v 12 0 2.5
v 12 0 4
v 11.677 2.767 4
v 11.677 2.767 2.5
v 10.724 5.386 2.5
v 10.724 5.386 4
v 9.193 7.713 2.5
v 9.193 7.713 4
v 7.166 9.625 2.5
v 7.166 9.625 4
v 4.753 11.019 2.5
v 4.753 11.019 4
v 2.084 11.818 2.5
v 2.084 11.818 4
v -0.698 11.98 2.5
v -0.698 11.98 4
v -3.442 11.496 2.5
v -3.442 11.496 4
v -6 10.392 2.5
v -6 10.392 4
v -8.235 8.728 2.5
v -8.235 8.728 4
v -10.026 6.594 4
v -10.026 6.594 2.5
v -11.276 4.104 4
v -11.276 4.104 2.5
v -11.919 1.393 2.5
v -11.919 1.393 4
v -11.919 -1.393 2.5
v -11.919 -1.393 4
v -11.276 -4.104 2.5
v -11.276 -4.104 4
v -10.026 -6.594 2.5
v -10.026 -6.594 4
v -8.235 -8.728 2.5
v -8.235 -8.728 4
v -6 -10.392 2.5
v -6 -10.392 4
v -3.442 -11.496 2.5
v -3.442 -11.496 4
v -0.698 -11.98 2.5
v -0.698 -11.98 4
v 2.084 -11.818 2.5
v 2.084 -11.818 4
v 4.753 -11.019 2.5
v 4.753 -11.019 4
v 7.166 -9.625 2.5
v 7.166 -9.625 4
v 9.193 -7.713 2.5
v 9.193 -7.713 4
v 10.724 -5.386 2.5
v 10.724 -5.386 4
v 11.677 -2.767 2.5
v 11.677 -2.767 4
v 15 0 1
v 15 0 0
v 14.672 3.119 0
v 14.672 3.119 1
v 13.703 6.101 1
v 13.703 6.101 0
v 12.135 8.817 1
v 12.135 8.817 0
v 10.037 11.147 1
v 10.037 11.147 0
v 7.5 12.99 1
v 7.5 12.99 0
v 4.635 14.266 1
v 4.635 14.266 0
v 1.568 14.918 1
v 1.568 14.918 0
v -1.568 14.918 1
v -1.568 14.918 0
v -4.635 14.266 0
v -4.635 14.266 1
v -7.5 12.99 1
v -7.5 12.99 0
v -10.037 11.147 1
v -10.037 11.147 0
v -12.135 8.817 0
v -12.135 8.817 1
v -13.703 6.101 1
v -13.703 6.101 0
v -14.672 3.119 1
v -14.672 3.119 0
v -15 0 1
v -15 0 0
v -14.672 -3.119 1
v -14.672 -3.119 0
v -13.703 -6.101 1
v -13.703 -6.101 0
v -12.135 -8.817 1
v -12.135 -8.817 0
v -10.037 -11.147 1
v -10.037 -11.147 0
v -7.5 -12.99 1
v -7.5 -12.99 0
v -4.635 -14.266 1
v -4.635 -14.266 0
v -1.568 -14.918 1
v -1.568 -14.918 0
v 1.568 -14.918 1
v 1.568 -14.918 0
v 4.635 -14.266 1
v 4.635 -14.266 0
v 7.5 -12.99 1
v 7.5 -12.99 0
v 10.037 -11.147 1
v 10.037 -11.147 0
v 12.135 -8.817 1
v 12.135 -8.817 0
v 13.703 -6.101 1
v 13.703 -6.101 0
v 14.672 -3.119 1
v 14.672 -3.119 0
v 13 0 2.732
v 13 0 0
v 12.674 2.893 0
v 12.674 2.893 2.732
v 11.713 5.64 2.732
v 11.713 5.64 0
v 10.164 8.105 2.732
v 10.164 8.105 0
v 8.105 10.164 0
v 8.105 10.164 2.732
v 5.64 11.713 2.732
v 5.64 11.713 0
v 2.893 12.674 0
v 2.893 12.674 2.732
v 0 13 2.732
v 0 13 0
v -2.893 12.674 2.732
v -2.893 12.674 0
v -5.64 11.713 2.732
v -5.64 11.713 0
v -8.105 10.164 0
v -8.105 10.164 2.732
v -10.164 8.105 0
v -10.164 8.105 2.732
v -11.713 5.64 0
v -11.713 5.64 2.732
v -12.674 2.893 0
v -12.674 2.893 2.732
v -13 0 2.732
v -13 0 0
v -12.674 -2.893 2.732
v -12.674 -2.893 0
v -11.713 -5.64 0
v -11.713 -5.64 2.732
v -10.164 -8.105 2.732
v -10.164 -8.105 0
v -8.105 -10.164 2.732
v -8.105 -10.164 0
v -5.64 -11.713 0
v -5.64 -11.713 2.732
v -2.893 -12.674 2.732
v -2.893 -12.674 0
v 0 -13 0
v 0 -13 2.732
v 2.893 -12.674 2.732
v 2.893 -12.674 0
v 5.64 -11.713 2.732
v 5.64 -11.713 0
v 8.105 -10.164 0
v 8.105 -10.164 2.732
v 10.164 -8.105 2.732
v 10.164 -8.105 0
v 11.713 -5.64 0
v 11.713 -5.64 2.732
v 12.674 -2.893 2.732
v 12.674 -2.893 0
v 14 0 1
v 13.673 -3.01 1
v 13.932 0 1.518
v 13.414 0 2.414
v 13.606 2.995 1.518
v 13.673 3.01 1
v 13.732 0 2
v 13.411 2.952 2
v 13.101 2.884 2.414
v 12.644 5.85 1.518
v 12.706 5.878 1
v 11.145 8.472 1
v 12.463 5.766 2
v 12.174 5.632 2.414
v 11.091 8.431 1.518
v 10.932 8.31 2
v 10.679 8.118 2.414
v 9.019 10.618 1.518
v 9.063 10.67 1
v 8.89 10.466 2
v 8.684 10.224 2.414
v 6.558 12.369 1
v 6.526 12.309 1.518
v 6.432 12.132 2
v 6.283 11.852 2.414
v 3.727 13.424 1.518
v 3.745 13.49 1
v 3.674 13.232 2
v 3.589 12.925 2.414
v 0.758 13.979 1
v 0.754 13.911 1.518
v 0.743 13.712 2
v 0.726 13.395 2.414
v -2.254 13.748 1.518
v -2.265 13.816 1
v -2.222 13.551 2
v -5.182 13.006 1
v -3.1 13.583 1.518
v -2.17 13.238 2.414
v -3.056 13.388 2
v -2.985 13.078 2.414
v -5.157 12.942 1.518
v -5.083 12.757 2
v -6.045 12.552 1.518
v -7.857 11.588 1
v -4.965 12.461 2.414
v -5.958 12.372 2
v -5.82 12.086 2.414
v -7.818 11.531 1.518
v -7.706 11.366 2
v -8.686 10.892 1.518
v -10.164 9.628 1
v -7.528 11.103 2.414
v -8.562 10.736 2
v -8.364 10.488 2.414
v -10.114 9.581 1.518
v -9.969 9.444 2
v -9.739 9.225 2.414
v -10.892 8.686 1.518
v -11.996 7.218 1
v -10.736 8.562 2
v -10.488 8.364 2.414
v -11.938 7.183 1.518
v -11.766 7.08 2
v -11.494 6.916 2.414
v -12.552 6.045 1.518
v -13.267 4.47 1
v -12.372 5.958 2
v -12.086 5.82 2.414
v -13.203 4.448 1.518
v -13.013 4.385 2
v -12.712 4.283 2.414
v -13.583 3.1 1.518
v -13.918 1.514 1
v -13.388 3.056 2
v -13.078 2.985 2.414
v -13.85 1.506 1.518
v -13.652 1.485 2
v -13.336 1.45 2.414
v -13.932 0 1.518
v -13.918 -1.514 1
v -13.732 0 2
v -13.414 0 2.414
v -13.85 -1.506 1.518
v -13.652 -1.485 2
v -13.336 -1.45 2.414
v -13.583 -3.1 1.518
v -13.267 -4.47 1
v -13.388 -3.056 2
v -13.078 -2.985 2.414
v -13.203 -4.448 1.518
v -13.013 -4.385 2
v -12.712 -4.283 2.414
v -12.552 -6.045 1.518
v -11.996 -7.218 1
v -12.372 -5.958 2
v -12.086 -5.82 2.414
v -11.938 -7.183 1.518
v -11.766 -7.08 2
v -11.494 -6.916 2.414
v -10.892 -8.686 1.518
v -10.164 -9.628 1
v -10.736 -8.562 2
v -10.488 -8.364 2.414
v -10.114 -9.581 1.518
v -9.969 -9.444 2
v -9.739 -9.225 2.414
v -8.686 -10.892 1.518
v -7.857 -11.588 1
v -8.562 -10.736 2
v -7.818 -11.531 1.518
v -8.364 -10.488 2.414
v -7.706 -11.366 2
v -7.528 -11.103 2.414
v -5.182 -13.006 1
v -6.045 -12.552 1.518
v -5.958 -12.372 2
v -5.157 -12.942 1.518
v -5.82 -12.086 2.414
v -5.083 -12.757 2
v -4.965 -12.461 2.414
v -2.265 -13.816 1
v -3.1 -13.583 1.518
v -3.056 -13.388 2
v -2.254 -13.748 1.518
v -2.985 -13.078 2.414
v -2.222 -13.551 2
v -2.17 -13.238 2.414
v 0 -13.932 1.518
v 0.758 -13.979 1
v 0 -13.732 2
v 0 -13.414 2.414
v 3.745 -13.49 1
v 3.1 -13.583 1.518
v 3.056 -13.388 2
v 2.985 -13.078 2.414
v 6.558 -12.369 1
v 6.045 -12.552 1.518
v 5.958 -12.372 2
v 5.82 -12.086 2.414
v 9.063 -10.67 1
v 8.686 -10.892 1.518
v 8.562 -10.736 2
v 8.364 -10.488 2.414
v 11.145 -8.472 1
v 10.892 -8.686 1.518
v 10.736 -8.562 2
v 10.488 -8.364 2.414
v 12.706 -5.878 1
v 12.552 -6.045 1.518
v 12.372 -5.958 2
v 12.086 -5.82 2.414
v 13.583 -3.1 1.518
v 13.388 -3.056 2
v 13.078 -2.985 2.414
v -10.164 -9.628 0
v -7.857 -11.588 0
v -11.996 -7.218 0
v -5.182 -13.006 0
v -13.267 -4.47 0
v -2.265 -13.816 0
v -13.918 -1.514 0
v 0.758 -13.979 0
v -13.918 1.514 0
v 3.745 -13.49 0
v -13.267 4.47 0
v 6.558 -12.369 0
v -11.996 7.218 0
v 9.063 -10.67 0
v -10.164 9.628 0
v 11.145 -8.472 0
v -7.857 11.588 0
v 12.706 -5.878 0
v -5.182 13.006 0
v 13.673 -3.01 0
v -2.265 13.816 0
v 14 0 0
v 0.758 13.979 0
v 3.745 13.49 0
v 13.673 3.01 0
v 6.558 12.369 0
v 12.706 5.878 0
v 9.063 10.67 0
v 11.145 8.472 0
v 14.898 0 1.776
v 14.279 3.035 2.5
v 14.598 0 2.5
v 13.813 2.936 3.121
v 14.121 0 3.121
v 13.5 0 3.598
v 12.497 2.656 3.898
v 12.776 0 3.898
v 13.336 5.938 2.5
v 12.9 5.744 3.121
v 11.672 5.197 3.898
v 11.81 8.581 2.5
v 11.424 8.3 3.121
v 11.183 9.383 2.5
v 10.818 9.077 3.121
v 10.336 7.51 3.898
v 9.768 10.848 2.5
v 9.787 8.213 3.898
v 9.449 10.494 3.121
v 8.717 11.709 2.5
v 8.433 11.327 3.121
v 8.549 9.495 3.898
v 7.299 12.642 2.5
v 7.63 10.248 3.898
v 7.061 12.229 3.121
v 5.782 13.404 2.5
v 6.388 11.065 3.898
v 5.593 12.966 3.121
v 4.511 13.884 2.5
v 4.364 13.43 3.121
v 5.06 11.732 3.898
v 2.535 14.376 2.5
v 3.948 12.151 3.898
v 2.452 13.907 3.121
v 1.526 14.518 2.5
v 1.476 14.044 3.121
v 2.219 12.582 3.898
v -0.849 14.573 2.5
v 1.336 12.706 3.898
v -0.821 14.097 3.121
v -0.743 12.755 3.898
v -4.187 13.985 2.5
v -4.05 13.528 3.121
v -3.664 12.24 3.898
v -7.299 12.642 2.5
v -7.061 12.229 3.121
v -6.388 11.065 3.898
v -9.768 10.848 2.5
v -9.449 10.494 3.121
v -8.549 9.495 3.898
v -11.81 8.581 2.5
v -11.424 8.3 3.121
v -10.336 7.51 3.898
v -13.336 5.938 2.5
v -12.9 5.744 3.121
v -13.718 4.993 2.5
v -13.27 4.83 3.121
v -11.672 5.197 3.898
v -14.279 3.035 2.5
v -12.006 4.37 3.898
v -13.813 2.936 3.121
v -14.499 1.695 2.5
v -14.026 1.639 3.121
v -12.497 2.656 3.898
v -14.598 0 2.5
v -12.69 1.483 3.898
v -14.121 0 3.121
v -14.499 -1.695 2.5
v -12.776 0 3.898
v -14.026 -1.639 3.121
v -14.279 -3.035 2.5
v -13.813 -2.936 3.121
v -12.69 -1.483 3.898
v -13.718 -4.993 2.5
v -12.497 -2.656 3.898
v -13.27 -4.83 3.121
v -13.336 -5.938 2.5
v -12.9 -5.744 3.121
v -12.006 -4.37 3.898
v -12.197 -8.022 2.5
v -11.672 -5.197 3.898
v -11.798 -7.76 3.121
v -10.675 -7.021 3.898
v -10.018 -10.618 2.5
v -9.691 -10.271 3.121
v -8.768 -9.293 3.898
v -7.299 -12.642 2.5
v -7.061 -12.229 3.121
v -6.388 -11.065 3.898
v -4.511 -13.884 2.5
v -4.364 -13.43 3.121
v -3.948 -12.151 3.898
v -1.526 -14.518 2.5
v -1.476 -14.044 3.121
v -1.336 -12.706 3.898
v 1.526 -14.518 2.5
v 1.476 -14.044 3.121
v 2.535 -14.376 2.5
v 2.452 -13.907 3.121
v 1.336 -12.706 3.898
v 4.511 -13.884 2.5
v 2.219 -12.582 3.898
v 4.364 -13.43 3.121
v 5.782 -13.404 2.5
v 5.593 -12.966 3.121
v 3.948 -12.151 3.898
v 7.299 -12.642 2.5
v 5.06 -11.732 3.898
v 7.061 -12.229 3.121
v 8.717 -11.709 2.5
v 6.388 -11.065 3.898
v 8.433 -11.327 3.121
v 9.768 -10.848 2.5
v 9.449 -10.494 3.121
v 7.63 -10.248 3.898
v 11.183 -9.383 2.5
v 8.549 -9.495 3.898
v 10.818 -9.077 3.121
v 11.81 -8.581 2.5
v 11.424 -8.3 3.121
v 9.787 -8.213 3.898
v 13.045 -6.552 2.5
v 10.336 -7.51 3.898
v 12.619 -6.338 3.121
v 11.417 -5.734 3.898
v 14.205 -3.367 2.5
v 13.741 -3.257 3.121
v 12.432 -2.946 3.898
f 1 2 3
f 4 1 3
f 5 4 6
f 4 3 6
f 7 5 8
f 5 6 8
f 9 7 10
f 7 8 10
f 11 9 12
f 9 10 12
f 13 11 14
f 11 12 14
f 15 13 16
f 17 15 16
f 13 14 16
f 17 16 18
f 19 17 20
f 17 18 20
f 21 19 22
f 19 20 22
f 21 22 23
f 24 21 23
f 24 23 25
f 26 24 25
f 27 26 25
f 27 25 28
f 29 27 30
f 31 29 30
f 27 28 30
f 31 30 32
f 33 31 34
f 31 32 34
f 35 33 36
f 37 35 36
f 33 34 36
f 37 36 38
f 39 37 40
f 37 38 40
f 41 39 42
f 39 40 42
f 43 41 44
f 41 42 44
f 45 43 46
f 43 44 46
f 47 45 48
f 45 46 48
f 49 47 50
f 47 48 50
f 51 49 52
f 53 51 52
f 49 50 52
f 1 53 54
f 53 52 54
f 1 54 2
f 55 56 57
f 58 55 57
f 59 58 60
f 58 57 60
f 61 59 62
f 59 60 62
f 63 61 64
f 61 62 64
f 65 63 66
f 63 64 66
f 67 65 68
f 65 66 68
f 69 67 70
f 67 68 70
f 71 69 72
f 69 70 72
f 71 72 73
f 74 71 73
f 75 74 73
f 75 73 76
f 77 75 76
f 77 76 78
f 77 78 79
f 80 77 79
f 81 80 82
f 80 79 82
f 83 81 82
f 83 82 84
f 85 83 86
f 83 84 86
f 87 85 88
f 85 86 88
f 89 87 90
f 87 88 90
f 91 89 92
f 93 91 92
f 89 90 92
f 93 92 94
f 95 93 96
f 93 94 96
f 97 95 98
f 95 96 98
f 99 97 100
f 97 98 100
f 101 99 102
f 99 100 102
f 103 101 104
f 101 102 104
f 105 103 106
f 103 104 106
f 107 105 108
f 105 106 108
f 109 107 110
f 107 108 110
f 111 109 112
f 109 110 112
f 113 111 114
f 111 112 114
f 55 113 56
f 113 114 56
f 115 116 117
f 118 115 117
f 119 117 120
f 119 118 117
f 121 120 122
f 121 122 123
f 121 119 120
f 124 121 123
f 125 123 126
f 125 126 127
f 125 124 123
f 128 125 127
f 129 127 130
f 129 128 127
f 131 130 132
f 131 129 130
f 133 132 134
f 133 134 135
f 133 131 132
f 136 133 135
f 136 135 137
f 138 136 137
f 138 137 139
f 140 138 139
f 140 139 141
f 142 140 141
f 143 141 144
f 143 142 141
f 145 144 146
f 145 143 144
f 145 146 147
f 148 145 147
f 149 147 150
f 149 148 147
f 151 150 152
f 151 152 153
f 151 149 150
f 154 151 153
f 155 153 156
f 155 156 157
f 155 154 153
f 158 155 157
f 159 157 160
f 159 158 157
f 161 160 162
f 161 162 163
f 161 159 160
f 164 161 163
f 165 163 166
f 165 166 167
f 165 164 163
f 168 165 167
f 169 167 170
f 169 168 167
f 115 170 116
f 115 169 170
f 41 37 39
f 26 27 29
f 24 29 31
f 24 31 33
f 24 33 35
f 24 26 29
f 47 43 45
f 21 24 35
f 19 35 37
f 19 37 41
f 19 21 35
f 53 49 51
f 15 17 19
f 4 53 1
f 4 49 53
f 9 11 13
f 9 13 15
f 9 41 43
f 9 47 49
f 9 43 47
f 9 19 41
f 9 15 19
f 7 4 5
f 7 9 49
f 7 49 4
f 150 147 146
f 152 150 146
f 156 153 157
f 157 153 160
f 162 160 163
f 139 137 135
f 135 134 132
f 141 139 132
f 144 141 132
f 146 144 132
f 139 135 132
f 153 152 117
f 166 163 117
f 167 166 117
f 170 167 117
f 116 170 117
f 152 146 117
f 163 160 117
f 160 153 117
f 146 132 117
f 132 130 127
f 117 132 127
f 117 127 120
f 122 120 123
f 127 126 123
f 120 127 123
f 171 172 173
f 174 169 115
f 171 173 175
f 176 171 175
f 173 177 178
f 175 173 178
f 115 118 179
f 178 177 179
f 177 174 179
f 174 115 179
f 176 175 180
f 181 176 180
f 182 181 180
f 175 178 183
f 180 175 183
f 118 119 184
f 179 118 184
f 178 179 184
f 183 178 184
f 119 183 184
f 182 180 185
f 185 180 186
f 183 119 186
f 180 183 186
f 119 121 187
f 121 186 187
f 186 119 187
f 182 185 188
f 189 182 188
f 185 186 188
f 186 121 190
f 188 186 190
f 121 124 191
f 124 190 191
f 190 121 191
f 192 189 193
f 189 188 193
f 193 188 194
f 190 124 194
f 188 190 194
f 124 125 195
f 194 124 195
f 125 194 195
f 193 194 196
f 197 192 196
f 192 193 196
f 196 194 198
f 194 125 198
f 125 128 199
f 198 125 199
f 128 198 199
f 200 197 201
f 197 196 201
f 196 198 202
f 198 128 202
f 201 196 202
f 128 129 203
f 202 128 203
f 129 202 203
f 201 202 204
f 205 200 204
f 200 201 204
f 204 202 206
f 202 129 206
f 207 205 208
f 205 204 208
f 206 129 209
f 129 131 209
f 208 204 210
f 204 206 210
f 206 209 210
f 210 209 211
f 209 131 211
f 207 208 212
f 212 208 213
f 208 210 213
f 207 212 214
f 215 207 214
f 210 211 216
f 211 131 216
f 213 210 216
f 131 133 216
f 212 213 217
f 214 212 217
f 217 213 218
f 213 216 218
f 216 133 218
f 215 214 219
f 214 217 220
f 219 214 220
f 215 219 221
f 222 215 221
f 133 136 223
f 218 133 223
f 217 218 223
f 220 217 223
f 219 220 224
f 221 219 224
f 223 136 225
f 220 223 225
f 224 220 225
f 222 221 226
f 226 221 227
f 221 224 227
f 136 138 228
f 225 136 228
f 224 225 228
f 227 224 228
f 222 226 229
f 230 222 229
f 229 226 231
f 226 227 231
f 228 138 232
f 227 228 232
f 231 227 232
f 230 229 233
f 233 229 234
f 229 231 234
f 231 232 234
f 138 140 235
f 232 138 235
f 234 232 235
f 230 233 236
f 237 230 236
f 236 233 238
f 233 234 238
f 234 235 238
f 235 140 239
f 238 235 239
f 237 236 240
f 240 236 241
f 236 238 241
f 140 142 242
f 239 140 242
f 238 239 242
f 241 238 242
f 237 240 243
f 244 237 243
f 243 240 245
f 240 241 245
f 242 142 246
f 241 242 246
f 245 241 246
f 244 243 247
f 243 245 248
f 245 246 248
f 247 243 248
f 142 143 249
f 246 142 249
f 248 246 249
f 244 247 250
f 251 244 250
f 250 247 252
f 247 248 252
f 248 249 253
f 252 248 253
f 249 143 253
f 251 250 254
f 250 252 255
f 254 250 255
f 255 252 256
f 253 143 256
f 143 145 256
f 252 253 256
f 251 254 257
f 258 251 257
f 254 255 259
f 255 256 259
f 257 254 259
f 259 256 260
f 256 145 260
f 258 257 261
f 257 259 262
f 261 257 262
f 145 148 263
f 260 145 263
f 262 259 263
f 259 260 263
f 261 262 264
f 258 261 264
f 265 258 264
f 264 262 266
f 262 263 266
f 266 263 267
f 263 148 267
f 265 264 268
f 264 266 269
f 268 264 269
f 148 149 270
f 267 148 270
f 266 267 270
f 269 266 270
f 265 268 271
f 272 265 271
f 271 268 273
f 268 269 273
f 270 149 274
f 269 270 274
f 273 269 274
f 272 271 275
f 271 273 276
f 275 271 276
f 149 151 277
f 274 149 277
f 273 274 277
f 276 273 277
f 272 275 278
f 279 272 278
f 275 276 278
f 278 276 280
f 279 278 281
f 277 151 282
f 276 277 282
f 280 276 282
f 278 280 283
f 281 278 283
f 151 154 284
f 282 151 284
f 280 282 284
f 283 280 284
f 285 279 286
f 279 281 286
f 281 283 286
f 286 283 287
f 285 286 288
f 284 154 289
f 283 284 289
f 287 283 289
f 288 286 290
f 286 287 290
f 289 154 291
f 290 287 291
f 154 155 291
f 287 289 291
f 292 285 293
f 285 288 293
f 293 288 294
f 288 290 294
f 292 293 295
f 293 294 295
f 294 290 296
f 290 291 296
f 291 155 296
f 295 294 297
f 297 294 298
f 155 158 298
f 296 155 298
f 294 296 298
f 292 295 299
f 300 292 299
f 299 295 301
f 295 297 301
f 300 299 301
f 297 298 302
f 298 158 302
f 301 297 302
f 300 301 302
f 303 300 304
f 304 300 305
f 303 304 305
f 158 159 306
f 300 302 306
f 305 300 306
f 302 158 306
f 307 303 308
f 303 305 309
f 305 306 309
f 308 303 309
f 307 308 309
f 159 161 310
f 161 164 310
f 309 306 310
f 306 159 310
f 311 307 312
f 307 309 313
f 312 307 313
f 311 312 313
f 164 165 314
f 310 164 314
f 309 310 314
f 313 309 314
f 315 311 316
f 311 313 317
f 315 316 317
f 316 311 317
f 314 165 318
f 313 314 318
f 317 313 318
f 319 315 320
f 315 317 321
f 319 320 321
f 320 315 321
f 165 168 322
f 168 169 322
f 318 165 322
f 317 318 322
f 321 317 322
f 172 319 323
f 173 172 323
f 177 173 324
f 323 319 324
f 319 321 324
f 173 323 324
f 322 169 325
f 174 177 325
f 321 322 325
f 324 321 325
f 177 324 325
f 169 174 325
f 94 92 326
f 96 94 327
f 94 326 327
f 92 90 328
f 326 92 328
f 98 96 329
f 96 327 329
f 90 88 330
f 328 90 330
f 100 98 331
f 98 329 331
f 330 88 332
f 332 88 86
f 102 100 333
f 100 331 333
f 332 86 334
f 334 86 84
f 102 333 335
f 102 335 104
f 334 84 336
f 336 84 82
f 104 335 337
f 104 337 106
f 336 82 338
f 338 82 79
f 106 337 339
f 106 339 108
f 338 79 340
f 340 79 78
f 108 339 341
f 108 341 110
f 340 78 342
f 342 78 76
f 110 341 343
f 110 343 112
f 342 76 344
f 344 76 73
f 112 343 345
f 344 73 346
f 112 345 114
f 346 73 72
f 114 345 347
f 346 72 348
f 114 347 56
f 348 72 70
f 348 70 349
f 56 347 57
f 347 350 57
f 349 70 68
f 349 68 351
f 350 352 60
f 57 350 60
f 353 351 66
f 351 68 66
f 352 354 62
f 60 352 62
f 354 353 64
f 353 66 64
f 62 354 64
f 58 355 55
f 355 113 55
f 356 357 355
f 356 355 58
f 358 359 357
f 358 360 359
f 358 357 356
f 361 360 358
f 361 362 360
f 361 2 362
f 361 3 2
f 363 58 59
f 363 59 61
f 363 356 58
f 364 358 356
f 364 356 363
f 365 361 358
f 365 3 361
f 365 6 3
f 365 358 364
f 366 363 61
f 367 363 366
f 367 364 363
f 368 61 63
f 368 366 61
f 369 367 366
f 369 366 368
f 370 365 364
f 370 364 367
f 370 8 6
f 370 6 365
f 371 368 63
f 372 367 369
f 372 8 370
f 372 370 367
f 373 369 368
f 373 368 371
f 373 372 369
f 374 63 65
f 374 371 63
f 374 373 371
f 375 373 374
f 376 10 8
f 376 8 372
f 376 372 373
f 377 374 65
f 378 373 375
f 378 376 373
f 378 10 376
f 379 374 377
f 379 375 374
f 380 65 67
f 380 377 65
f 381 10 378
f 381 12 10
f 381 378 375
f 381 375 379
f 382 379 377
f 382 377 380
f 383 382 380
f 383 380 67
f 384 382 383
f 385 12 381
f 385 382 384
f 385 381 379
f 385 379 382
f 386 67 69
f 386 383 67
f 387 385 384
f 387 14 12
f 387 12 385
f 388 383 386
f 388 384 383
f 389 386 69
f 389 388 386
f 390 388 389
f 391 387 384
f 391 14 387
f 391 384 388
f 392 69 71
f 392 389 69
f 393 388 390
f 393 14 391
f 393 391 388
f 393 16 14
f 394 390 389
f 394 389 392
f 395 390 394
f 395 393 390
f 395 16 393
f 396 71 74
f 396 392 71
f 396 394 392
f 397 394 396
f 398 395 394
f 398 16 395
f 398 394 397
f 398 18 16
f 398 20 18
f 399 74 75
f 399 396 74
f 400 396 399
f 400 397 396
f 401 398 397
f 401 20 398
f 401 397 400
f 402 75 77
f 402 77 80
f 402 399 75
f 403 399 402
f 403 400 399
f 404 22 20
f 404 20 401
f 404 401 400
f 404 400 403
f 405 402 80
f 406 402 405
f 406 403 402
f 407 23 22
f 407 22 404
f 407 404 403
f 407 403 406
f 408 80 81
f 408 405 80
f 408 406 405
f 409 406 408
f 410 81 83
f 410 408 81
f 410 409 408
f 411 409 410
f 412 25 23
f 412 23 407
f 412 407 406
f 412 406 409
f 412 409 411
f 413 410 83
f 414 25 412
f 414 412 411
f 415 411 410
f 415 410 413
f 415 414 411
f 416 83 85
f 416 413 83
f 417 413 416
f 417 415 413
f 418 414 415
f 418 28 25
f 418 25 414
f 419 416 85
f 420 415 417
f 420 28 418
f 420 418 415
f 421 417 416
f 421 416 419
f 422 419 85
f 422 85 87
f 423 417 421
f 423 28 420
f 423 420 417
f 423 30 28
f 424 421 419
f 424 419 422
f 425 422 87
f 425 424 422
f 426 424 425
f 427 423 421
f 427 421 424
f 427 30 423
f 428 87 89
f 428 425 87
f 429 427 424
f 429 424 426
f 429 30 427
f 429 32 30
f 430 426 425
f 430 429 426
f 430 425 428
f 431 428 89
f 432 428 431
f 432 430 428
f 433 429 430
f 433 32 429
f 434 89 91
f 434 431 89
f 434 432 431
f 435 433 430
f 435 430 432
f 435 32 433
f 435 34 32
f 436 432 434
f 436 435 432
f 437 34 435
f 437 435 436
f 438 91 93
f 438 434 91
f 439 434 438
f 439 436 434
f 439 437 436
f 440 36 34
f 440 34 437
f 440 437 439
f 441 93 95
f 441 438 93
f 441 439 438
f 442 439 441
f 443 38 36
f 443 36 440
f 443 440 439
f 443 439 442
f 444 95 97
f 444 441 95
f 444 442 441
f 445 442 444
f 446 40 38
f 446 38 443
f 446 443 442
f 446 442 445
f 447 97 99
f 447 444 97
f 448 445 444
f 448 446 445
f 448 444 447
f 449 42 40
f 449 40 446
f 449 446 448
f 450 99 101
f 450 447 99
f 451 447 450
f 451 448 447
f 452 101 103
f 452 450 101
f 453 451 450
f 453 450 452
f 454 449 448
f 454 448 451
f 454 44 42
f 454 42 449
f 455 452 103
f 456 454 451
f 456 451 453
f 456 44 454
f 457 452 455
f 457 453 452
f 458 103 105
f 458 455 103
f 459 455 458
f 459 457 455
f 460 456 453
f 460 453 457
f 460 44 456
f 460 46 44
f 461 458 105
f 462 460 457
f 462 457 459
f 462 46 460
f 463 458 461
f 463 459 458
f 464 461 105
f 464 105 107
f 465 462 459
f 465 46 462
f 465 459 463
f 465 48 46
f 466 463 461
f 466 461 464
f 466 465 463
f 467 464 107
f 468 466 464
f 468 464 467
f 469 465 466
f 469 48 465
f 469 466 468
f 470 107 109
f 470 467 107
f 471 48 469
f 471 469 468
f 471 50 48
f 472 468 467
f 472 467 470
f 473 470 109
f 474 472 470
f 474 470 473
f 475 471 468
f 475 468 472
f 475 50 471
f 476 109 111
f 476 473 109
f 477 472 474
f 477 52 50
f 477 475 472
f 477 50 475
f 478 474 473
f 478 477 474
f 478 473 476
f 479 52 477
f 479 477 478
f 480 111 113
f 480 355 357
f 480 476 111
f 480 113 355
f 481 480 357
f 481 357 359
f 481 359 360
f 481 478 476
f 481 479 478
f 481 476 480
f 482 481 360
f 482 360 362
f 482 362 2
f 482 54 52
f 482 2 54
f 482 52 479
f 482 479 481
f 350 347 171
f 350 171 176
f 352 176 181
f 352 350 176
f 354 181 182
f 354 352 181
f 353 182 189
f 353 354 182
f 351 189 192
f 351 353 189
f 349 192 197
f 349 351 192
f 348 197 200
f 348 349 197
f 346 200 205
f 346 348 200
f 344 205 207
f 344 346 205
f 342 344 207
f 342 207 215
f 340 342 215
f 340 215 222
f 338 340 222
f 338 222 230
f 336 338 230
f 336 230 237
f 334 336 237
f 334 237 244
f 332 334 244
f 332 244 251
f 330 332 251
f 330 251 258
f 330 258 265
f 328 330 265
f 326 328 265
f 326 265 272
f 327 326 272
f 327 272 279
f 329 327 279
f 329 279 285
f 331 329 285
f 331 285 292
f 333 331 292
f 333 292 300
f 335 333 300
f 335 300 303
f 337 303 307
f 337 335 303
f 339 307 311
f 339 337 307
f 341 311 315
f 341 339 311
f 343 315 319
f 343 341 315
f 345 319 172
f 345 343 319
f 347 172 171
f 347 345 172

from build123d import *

# Parameters (mm, degrees)
F0_R     = 15
F1_DEPTH = 4
F2_R     = 3
F3_DEPTH = 1.5
F4_T     = -1
F5_DEPTH = 1.5


with BuildPart() as f1:
    # F0 (on Top) → F1 (new body)
    with BuildSketch(Plane.XY):
        Circle(F0_R)
    extrude(amount=F1_DEPTH)

    # F2
    f2_edges = [f1.edges().sort_by_distance(p)[0] for p in [
        (-15, 0, 4),
    ]]
    fillet(f2_edges, radius=F2_R)

    # F3 (cut): a face of the model
    f3_faces = [f1.faces().sort_by_distance(p)[0] for p in [
        (0, 0, 4),
    ]]
    extrude(f3_faces, amount=-F3_DEPTH, mode=Mode.SUBTRACT)

    # F4
    f4_openings = [f1.faces().sort_by_distance(p)[0] for p in [
        (0, 0, 0),
    ]]
    offset(amount=F4_T, openings=f4_openings, kind=Kind.INTERSECTION)

    # F5 (add): a face of the model
    f5_faces = [f1.faces().sort_by_distance(p)[0] for p in [
        (0, 0, 1.5),
    ]]
    extrude(f5_faces, amount=F5_DEPTH)


solid = f1.part
